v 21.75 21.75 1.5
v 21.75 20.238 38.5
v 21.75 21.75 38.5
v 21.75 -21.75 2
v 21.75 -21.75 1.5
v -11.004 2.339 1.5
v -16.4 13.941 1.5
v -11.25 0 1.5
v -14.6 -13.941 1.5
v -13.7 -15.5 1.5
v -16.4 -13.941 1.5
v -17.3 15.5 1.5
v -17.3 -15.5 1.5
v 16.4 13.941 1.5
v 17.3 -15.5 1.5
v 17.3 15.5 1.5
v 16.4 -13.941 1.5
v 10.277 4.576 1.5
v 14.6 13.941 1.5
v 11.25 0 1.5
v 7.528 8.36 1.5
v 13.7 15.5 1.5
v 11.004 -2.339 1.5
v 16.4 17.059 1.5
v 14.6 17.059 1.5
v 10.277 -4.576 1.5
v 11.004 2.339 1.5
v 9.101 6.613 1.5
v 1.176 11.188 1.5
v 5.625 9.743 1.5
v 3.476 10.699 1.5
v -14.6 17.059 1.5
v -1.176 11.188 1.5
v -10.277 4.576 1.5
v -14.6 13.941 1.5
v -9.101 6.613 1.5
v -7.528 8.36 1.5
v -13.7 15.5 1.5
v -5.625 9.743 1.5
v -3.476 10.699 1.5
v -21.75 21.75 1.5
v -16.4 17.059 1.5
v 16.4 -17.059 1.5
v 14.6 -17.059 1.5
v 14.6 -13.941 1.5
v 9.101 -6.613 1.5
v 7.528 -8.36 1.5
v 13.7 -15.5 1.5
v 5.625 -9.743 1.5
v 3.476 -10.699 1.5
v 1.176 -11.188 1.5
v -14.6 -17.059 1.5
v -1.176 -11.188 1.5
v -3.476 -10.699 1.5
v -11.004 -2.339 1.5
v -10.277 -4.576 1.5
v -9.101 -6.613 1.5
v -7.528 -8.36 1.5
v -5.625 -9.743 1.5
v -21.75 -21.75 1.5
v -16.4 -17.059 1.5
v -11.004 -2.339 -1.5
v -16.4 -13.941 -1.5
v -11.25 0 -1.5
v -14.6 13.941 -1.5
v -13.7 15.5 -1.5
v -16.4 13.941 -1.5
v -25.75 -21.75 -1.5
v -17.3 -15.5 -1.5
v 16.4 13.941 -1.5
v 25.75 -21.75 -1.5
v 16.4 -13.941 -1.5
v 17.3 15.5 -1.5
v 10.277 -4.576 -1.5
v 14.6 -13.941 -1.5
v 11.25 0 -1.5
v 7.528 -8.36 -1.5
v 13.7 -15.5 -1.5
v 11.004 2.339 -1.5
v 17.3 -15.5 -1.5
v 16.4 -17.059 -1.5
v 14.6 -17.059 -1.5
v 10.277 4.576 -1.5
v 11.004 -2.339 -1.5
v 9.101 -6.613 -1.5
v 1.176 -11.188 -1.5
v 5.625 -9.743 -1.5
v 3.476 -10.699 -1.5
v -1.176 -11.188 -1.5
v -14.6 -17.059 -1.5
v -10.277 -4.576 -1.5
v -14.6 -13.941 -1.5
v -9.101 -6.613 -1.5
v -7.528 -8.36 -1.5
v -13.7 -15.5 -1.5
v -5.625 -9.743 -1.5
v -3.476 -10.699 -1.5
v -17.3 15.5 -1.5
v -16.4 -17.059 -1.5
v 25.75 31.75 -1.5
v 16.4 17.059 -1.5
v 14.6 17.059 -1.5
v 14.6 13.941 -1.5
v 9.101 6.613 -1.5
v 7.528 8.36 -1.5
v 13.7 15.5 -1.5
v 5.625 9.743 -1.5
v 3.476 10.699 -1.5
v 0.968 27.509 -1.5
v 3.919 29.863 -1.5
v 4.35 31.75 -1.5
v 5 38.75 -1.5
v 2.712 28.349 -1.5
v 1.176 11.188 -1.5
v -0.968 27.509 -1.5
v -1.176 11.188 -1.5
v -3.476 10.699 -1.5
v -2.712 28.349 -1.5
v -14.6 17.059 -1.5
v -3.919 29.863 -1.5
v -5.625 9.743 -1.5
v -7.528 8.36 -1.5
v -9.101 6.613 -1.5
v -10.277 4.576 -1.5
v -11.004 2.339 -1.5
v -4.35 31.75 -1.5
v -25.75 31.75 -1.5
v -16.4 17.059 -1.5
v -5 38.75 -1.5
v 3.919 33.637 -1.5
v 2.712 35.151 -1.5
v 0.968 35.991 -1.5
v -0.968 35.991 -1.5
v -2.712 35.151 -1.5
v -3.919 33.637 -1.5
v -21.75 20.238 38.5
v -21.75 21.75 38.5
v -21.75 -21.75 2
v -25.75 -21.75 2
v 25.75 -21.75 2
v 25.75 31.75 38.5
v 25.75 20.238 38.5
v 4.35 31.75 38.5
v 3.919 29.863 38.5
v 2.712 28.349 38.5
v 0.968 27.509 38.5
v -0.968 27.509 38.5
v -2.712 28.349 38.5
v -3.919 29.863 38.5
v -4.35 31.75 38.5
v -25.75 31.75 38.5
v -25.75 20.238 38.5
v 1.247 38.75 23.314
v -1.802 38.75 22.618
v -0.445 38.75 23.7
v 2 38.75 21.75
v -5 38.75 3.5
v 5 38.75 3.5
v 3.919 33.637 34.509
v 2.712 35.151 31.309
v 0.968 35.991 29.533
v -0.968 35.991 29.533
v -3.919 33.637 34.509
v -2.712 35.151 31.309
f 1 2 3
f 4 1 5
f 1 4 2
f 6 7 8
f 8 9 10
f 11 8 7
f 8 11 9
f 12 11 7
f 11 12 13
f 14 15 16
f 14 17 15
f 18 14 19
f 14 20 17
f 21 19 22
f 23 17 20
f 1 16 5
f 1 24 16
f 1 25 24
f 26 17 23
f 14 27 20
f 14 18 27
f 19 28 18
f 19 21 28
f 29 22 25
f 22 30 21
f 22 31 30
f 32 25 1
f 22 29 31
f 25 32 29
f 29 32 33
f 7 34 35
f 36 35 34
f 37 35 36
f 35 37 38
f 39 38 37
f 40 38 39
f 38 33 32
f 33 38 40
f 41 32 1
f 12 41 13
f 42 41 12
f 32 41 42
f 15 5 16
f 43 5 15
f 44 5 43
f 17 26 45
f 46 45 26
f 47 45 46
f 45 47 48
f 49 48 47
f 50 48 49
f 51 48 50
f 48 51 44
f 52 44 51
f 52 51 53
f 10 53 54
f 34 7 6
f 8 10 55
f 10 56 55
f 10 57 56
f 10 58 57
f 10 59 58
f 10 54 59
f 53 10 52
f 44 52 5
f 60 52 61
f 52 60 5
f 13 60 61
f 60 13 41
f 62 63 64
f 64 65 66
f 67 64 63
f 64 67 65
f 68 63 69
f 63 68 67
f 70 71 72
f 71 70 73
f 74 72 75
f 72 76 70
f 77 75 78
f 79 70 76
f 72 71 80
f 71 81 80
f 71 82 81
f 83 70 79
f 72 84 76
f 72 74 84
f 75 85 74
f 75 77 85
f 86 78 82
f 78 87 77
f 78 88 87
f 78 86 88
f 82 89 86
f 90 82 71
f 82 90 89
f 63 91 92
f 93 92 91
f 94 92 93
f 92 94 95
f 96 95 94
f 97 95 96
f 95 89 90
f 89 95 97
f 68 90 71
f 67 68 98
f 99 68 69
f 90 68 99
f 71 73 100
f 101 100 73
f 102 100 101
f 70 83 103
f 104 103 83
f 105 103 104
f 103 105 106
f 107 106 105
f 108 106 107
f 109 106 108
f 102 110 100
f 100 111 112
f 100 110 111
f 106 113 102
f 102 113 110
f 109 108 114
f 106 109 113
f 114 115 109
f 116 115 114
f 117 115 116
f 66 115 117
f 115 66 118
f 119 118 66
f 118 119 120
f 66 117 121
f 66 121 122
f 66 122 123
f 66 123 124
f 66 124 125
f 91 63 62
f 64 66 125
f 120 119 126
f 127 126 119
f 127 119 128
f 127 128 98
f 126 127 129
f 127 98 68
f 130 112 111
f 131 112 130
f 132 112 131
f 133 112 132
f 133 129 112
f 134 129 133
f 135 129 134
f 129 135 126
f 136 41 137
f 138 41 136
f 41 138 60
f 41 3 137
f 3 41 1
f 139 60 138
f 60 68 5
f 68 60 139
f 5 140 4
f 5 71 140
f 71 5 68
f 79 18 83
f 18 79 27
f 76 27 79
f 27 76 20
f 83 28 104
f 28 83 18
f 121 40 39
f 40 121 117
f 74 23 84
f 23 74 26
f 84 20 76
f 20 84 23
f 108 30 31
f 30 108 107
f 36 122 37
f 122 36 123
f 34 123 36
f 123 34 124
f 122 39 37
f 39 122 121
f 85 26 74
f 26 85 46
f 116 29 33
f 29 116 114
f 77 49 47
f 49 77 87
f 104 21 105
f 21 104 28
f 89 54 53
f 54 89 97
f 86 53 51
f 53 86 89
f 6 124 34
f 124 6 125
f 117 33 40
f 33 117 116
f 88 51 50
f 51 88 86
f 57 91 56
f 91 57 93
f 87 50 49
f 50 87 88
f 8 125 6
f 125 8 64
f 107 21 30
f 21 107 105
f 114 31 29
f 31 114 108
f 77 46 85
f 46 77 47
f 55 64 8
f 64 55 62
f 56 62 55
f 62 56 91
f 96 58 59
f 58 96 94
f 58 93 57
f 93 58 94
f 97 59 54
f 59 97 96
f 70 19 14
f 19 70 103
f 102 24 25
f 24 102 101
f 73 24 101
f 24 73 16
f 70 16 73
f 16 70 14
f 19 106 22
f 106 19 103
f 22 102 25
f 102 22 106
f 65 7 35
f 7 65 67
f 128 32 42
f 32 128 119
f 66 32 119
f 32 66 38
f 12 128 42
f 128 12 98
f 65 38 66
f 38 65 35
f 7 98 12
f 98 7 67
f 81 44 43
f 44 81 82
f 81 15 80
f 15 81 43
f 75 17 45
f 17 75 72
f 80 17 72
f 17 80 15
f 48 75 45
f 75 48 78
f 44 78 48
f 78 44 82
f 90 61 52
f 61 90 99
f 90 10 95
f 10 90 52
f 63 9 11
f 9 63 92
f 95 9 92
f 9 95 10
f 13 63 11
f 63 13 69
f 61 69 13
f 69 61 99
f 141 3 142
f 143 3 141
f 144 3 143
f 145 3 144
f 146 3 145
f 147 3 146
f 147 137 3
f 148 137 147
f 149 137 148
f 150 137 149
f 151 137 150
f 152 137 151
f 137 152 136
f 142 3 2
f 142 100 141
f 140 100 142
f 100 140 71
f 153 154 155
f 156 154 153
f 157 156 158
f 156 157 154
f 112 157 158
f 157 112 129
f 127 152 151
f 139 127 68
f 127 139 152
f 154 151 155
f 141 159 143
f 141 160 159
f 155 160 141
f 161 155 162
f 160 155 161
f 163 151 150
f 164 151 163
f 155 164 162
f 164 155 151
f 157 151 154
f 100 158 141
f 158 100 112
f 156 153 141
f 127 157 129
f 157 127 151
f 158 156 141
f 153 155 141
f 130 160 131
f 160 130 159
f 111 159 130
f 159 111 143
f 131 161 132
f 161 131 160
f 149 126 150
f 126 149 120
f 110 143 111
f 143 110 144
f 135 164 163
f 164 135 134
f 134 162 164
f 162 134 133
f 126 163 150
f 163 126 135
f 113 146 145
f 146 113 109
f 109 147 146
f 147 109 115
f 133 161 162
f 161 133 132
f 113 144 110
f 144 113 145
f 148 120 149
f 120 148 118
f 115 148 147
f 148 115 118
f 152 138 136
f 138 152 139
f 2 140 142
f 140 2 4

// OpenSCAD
//X and Y Motor Mount


//Nema17
N17ScrewHoleSizeR = 1.8;
N17ScrewHoleDistance = 31;
N17Width =43.5;
N17CenterHoleR = 22.5/2;
RodHole=8.7/2;

difference()
{
	cube([N17Width, N17Width, 3], center=true);
	cylinder(h=4,r=N17CenterHoleR, center=true);
	translate([N17ScrewHoleDistance/2,N17ScrewHoleDistance/2,-2], center=true) cylinder(h=4,r=N17ScrewHoleSizeR);
	translate([-N17ScrewHoleDistance/2,N17ScrewHoleDistance/2,-2], center=true) cylinder(h=4,r=N17ScrewHoleSizeR);
	translate([N17ScrewHoleDistance/2,-N17ScrewHoleDistance/2,-2], center=true) cylinder(h=4,r=N17ScrewHoleSizeR);
	translate([-N17ScrewHoleDistance/2,-N17ScrewHoleDistance/2,-2], center=true) cylinder(h=4,r=N17ScrewHoleSizeR);
}


RodSupportWidth=10;
SideWallWidth = 4;
difference()
{
	hull()
	{
		translate([-N17Width/2-SideWallWidth,N17Width/2,-1.5]) cube([N17Width+SideWallWidth*2,RodSupportWidth,40]);
		translate([0,N17Width/2,N17Width/2]) rotate([270,0,0])  cylinder(h=RodSupportWidth+7,r=2);
		translate([-5,N17Width/2,-1.5])   cube([10,RodSupportWidth+7,5]);
	}

	translate([0,N17Width/2+RodSupportWidth/2+5,-2] ) cylinder(h=90,r=RodHole);
}



//SideWall Left
difference()
{
	translate([-N17Width/2-SideWallWidth,-N17Width/2,-1.5]) cube([SideWallWidth,N17Width+RodSupportWidth,40]);
	translate([-N17Width/2-SideWallWidth-1,-N17Width/2,2]) rotate([41,0,0]) cube([SideWallWidth+1.1,N17Width+RodSupportWidth+5,45]);
}


//SideWall Right
difference()
{
	translate([N17Width/2,-N17Width/2,-1.5]) cube([SideWallWidth,N17Width+RodSupportWidth,40]);
	translate([N17Width/2-1,-N17Width/2,2]) rotate([41,0,0]) cube([SideWallWidth+1.1,N17Width+RodSupportWidth+5,45]);
}
